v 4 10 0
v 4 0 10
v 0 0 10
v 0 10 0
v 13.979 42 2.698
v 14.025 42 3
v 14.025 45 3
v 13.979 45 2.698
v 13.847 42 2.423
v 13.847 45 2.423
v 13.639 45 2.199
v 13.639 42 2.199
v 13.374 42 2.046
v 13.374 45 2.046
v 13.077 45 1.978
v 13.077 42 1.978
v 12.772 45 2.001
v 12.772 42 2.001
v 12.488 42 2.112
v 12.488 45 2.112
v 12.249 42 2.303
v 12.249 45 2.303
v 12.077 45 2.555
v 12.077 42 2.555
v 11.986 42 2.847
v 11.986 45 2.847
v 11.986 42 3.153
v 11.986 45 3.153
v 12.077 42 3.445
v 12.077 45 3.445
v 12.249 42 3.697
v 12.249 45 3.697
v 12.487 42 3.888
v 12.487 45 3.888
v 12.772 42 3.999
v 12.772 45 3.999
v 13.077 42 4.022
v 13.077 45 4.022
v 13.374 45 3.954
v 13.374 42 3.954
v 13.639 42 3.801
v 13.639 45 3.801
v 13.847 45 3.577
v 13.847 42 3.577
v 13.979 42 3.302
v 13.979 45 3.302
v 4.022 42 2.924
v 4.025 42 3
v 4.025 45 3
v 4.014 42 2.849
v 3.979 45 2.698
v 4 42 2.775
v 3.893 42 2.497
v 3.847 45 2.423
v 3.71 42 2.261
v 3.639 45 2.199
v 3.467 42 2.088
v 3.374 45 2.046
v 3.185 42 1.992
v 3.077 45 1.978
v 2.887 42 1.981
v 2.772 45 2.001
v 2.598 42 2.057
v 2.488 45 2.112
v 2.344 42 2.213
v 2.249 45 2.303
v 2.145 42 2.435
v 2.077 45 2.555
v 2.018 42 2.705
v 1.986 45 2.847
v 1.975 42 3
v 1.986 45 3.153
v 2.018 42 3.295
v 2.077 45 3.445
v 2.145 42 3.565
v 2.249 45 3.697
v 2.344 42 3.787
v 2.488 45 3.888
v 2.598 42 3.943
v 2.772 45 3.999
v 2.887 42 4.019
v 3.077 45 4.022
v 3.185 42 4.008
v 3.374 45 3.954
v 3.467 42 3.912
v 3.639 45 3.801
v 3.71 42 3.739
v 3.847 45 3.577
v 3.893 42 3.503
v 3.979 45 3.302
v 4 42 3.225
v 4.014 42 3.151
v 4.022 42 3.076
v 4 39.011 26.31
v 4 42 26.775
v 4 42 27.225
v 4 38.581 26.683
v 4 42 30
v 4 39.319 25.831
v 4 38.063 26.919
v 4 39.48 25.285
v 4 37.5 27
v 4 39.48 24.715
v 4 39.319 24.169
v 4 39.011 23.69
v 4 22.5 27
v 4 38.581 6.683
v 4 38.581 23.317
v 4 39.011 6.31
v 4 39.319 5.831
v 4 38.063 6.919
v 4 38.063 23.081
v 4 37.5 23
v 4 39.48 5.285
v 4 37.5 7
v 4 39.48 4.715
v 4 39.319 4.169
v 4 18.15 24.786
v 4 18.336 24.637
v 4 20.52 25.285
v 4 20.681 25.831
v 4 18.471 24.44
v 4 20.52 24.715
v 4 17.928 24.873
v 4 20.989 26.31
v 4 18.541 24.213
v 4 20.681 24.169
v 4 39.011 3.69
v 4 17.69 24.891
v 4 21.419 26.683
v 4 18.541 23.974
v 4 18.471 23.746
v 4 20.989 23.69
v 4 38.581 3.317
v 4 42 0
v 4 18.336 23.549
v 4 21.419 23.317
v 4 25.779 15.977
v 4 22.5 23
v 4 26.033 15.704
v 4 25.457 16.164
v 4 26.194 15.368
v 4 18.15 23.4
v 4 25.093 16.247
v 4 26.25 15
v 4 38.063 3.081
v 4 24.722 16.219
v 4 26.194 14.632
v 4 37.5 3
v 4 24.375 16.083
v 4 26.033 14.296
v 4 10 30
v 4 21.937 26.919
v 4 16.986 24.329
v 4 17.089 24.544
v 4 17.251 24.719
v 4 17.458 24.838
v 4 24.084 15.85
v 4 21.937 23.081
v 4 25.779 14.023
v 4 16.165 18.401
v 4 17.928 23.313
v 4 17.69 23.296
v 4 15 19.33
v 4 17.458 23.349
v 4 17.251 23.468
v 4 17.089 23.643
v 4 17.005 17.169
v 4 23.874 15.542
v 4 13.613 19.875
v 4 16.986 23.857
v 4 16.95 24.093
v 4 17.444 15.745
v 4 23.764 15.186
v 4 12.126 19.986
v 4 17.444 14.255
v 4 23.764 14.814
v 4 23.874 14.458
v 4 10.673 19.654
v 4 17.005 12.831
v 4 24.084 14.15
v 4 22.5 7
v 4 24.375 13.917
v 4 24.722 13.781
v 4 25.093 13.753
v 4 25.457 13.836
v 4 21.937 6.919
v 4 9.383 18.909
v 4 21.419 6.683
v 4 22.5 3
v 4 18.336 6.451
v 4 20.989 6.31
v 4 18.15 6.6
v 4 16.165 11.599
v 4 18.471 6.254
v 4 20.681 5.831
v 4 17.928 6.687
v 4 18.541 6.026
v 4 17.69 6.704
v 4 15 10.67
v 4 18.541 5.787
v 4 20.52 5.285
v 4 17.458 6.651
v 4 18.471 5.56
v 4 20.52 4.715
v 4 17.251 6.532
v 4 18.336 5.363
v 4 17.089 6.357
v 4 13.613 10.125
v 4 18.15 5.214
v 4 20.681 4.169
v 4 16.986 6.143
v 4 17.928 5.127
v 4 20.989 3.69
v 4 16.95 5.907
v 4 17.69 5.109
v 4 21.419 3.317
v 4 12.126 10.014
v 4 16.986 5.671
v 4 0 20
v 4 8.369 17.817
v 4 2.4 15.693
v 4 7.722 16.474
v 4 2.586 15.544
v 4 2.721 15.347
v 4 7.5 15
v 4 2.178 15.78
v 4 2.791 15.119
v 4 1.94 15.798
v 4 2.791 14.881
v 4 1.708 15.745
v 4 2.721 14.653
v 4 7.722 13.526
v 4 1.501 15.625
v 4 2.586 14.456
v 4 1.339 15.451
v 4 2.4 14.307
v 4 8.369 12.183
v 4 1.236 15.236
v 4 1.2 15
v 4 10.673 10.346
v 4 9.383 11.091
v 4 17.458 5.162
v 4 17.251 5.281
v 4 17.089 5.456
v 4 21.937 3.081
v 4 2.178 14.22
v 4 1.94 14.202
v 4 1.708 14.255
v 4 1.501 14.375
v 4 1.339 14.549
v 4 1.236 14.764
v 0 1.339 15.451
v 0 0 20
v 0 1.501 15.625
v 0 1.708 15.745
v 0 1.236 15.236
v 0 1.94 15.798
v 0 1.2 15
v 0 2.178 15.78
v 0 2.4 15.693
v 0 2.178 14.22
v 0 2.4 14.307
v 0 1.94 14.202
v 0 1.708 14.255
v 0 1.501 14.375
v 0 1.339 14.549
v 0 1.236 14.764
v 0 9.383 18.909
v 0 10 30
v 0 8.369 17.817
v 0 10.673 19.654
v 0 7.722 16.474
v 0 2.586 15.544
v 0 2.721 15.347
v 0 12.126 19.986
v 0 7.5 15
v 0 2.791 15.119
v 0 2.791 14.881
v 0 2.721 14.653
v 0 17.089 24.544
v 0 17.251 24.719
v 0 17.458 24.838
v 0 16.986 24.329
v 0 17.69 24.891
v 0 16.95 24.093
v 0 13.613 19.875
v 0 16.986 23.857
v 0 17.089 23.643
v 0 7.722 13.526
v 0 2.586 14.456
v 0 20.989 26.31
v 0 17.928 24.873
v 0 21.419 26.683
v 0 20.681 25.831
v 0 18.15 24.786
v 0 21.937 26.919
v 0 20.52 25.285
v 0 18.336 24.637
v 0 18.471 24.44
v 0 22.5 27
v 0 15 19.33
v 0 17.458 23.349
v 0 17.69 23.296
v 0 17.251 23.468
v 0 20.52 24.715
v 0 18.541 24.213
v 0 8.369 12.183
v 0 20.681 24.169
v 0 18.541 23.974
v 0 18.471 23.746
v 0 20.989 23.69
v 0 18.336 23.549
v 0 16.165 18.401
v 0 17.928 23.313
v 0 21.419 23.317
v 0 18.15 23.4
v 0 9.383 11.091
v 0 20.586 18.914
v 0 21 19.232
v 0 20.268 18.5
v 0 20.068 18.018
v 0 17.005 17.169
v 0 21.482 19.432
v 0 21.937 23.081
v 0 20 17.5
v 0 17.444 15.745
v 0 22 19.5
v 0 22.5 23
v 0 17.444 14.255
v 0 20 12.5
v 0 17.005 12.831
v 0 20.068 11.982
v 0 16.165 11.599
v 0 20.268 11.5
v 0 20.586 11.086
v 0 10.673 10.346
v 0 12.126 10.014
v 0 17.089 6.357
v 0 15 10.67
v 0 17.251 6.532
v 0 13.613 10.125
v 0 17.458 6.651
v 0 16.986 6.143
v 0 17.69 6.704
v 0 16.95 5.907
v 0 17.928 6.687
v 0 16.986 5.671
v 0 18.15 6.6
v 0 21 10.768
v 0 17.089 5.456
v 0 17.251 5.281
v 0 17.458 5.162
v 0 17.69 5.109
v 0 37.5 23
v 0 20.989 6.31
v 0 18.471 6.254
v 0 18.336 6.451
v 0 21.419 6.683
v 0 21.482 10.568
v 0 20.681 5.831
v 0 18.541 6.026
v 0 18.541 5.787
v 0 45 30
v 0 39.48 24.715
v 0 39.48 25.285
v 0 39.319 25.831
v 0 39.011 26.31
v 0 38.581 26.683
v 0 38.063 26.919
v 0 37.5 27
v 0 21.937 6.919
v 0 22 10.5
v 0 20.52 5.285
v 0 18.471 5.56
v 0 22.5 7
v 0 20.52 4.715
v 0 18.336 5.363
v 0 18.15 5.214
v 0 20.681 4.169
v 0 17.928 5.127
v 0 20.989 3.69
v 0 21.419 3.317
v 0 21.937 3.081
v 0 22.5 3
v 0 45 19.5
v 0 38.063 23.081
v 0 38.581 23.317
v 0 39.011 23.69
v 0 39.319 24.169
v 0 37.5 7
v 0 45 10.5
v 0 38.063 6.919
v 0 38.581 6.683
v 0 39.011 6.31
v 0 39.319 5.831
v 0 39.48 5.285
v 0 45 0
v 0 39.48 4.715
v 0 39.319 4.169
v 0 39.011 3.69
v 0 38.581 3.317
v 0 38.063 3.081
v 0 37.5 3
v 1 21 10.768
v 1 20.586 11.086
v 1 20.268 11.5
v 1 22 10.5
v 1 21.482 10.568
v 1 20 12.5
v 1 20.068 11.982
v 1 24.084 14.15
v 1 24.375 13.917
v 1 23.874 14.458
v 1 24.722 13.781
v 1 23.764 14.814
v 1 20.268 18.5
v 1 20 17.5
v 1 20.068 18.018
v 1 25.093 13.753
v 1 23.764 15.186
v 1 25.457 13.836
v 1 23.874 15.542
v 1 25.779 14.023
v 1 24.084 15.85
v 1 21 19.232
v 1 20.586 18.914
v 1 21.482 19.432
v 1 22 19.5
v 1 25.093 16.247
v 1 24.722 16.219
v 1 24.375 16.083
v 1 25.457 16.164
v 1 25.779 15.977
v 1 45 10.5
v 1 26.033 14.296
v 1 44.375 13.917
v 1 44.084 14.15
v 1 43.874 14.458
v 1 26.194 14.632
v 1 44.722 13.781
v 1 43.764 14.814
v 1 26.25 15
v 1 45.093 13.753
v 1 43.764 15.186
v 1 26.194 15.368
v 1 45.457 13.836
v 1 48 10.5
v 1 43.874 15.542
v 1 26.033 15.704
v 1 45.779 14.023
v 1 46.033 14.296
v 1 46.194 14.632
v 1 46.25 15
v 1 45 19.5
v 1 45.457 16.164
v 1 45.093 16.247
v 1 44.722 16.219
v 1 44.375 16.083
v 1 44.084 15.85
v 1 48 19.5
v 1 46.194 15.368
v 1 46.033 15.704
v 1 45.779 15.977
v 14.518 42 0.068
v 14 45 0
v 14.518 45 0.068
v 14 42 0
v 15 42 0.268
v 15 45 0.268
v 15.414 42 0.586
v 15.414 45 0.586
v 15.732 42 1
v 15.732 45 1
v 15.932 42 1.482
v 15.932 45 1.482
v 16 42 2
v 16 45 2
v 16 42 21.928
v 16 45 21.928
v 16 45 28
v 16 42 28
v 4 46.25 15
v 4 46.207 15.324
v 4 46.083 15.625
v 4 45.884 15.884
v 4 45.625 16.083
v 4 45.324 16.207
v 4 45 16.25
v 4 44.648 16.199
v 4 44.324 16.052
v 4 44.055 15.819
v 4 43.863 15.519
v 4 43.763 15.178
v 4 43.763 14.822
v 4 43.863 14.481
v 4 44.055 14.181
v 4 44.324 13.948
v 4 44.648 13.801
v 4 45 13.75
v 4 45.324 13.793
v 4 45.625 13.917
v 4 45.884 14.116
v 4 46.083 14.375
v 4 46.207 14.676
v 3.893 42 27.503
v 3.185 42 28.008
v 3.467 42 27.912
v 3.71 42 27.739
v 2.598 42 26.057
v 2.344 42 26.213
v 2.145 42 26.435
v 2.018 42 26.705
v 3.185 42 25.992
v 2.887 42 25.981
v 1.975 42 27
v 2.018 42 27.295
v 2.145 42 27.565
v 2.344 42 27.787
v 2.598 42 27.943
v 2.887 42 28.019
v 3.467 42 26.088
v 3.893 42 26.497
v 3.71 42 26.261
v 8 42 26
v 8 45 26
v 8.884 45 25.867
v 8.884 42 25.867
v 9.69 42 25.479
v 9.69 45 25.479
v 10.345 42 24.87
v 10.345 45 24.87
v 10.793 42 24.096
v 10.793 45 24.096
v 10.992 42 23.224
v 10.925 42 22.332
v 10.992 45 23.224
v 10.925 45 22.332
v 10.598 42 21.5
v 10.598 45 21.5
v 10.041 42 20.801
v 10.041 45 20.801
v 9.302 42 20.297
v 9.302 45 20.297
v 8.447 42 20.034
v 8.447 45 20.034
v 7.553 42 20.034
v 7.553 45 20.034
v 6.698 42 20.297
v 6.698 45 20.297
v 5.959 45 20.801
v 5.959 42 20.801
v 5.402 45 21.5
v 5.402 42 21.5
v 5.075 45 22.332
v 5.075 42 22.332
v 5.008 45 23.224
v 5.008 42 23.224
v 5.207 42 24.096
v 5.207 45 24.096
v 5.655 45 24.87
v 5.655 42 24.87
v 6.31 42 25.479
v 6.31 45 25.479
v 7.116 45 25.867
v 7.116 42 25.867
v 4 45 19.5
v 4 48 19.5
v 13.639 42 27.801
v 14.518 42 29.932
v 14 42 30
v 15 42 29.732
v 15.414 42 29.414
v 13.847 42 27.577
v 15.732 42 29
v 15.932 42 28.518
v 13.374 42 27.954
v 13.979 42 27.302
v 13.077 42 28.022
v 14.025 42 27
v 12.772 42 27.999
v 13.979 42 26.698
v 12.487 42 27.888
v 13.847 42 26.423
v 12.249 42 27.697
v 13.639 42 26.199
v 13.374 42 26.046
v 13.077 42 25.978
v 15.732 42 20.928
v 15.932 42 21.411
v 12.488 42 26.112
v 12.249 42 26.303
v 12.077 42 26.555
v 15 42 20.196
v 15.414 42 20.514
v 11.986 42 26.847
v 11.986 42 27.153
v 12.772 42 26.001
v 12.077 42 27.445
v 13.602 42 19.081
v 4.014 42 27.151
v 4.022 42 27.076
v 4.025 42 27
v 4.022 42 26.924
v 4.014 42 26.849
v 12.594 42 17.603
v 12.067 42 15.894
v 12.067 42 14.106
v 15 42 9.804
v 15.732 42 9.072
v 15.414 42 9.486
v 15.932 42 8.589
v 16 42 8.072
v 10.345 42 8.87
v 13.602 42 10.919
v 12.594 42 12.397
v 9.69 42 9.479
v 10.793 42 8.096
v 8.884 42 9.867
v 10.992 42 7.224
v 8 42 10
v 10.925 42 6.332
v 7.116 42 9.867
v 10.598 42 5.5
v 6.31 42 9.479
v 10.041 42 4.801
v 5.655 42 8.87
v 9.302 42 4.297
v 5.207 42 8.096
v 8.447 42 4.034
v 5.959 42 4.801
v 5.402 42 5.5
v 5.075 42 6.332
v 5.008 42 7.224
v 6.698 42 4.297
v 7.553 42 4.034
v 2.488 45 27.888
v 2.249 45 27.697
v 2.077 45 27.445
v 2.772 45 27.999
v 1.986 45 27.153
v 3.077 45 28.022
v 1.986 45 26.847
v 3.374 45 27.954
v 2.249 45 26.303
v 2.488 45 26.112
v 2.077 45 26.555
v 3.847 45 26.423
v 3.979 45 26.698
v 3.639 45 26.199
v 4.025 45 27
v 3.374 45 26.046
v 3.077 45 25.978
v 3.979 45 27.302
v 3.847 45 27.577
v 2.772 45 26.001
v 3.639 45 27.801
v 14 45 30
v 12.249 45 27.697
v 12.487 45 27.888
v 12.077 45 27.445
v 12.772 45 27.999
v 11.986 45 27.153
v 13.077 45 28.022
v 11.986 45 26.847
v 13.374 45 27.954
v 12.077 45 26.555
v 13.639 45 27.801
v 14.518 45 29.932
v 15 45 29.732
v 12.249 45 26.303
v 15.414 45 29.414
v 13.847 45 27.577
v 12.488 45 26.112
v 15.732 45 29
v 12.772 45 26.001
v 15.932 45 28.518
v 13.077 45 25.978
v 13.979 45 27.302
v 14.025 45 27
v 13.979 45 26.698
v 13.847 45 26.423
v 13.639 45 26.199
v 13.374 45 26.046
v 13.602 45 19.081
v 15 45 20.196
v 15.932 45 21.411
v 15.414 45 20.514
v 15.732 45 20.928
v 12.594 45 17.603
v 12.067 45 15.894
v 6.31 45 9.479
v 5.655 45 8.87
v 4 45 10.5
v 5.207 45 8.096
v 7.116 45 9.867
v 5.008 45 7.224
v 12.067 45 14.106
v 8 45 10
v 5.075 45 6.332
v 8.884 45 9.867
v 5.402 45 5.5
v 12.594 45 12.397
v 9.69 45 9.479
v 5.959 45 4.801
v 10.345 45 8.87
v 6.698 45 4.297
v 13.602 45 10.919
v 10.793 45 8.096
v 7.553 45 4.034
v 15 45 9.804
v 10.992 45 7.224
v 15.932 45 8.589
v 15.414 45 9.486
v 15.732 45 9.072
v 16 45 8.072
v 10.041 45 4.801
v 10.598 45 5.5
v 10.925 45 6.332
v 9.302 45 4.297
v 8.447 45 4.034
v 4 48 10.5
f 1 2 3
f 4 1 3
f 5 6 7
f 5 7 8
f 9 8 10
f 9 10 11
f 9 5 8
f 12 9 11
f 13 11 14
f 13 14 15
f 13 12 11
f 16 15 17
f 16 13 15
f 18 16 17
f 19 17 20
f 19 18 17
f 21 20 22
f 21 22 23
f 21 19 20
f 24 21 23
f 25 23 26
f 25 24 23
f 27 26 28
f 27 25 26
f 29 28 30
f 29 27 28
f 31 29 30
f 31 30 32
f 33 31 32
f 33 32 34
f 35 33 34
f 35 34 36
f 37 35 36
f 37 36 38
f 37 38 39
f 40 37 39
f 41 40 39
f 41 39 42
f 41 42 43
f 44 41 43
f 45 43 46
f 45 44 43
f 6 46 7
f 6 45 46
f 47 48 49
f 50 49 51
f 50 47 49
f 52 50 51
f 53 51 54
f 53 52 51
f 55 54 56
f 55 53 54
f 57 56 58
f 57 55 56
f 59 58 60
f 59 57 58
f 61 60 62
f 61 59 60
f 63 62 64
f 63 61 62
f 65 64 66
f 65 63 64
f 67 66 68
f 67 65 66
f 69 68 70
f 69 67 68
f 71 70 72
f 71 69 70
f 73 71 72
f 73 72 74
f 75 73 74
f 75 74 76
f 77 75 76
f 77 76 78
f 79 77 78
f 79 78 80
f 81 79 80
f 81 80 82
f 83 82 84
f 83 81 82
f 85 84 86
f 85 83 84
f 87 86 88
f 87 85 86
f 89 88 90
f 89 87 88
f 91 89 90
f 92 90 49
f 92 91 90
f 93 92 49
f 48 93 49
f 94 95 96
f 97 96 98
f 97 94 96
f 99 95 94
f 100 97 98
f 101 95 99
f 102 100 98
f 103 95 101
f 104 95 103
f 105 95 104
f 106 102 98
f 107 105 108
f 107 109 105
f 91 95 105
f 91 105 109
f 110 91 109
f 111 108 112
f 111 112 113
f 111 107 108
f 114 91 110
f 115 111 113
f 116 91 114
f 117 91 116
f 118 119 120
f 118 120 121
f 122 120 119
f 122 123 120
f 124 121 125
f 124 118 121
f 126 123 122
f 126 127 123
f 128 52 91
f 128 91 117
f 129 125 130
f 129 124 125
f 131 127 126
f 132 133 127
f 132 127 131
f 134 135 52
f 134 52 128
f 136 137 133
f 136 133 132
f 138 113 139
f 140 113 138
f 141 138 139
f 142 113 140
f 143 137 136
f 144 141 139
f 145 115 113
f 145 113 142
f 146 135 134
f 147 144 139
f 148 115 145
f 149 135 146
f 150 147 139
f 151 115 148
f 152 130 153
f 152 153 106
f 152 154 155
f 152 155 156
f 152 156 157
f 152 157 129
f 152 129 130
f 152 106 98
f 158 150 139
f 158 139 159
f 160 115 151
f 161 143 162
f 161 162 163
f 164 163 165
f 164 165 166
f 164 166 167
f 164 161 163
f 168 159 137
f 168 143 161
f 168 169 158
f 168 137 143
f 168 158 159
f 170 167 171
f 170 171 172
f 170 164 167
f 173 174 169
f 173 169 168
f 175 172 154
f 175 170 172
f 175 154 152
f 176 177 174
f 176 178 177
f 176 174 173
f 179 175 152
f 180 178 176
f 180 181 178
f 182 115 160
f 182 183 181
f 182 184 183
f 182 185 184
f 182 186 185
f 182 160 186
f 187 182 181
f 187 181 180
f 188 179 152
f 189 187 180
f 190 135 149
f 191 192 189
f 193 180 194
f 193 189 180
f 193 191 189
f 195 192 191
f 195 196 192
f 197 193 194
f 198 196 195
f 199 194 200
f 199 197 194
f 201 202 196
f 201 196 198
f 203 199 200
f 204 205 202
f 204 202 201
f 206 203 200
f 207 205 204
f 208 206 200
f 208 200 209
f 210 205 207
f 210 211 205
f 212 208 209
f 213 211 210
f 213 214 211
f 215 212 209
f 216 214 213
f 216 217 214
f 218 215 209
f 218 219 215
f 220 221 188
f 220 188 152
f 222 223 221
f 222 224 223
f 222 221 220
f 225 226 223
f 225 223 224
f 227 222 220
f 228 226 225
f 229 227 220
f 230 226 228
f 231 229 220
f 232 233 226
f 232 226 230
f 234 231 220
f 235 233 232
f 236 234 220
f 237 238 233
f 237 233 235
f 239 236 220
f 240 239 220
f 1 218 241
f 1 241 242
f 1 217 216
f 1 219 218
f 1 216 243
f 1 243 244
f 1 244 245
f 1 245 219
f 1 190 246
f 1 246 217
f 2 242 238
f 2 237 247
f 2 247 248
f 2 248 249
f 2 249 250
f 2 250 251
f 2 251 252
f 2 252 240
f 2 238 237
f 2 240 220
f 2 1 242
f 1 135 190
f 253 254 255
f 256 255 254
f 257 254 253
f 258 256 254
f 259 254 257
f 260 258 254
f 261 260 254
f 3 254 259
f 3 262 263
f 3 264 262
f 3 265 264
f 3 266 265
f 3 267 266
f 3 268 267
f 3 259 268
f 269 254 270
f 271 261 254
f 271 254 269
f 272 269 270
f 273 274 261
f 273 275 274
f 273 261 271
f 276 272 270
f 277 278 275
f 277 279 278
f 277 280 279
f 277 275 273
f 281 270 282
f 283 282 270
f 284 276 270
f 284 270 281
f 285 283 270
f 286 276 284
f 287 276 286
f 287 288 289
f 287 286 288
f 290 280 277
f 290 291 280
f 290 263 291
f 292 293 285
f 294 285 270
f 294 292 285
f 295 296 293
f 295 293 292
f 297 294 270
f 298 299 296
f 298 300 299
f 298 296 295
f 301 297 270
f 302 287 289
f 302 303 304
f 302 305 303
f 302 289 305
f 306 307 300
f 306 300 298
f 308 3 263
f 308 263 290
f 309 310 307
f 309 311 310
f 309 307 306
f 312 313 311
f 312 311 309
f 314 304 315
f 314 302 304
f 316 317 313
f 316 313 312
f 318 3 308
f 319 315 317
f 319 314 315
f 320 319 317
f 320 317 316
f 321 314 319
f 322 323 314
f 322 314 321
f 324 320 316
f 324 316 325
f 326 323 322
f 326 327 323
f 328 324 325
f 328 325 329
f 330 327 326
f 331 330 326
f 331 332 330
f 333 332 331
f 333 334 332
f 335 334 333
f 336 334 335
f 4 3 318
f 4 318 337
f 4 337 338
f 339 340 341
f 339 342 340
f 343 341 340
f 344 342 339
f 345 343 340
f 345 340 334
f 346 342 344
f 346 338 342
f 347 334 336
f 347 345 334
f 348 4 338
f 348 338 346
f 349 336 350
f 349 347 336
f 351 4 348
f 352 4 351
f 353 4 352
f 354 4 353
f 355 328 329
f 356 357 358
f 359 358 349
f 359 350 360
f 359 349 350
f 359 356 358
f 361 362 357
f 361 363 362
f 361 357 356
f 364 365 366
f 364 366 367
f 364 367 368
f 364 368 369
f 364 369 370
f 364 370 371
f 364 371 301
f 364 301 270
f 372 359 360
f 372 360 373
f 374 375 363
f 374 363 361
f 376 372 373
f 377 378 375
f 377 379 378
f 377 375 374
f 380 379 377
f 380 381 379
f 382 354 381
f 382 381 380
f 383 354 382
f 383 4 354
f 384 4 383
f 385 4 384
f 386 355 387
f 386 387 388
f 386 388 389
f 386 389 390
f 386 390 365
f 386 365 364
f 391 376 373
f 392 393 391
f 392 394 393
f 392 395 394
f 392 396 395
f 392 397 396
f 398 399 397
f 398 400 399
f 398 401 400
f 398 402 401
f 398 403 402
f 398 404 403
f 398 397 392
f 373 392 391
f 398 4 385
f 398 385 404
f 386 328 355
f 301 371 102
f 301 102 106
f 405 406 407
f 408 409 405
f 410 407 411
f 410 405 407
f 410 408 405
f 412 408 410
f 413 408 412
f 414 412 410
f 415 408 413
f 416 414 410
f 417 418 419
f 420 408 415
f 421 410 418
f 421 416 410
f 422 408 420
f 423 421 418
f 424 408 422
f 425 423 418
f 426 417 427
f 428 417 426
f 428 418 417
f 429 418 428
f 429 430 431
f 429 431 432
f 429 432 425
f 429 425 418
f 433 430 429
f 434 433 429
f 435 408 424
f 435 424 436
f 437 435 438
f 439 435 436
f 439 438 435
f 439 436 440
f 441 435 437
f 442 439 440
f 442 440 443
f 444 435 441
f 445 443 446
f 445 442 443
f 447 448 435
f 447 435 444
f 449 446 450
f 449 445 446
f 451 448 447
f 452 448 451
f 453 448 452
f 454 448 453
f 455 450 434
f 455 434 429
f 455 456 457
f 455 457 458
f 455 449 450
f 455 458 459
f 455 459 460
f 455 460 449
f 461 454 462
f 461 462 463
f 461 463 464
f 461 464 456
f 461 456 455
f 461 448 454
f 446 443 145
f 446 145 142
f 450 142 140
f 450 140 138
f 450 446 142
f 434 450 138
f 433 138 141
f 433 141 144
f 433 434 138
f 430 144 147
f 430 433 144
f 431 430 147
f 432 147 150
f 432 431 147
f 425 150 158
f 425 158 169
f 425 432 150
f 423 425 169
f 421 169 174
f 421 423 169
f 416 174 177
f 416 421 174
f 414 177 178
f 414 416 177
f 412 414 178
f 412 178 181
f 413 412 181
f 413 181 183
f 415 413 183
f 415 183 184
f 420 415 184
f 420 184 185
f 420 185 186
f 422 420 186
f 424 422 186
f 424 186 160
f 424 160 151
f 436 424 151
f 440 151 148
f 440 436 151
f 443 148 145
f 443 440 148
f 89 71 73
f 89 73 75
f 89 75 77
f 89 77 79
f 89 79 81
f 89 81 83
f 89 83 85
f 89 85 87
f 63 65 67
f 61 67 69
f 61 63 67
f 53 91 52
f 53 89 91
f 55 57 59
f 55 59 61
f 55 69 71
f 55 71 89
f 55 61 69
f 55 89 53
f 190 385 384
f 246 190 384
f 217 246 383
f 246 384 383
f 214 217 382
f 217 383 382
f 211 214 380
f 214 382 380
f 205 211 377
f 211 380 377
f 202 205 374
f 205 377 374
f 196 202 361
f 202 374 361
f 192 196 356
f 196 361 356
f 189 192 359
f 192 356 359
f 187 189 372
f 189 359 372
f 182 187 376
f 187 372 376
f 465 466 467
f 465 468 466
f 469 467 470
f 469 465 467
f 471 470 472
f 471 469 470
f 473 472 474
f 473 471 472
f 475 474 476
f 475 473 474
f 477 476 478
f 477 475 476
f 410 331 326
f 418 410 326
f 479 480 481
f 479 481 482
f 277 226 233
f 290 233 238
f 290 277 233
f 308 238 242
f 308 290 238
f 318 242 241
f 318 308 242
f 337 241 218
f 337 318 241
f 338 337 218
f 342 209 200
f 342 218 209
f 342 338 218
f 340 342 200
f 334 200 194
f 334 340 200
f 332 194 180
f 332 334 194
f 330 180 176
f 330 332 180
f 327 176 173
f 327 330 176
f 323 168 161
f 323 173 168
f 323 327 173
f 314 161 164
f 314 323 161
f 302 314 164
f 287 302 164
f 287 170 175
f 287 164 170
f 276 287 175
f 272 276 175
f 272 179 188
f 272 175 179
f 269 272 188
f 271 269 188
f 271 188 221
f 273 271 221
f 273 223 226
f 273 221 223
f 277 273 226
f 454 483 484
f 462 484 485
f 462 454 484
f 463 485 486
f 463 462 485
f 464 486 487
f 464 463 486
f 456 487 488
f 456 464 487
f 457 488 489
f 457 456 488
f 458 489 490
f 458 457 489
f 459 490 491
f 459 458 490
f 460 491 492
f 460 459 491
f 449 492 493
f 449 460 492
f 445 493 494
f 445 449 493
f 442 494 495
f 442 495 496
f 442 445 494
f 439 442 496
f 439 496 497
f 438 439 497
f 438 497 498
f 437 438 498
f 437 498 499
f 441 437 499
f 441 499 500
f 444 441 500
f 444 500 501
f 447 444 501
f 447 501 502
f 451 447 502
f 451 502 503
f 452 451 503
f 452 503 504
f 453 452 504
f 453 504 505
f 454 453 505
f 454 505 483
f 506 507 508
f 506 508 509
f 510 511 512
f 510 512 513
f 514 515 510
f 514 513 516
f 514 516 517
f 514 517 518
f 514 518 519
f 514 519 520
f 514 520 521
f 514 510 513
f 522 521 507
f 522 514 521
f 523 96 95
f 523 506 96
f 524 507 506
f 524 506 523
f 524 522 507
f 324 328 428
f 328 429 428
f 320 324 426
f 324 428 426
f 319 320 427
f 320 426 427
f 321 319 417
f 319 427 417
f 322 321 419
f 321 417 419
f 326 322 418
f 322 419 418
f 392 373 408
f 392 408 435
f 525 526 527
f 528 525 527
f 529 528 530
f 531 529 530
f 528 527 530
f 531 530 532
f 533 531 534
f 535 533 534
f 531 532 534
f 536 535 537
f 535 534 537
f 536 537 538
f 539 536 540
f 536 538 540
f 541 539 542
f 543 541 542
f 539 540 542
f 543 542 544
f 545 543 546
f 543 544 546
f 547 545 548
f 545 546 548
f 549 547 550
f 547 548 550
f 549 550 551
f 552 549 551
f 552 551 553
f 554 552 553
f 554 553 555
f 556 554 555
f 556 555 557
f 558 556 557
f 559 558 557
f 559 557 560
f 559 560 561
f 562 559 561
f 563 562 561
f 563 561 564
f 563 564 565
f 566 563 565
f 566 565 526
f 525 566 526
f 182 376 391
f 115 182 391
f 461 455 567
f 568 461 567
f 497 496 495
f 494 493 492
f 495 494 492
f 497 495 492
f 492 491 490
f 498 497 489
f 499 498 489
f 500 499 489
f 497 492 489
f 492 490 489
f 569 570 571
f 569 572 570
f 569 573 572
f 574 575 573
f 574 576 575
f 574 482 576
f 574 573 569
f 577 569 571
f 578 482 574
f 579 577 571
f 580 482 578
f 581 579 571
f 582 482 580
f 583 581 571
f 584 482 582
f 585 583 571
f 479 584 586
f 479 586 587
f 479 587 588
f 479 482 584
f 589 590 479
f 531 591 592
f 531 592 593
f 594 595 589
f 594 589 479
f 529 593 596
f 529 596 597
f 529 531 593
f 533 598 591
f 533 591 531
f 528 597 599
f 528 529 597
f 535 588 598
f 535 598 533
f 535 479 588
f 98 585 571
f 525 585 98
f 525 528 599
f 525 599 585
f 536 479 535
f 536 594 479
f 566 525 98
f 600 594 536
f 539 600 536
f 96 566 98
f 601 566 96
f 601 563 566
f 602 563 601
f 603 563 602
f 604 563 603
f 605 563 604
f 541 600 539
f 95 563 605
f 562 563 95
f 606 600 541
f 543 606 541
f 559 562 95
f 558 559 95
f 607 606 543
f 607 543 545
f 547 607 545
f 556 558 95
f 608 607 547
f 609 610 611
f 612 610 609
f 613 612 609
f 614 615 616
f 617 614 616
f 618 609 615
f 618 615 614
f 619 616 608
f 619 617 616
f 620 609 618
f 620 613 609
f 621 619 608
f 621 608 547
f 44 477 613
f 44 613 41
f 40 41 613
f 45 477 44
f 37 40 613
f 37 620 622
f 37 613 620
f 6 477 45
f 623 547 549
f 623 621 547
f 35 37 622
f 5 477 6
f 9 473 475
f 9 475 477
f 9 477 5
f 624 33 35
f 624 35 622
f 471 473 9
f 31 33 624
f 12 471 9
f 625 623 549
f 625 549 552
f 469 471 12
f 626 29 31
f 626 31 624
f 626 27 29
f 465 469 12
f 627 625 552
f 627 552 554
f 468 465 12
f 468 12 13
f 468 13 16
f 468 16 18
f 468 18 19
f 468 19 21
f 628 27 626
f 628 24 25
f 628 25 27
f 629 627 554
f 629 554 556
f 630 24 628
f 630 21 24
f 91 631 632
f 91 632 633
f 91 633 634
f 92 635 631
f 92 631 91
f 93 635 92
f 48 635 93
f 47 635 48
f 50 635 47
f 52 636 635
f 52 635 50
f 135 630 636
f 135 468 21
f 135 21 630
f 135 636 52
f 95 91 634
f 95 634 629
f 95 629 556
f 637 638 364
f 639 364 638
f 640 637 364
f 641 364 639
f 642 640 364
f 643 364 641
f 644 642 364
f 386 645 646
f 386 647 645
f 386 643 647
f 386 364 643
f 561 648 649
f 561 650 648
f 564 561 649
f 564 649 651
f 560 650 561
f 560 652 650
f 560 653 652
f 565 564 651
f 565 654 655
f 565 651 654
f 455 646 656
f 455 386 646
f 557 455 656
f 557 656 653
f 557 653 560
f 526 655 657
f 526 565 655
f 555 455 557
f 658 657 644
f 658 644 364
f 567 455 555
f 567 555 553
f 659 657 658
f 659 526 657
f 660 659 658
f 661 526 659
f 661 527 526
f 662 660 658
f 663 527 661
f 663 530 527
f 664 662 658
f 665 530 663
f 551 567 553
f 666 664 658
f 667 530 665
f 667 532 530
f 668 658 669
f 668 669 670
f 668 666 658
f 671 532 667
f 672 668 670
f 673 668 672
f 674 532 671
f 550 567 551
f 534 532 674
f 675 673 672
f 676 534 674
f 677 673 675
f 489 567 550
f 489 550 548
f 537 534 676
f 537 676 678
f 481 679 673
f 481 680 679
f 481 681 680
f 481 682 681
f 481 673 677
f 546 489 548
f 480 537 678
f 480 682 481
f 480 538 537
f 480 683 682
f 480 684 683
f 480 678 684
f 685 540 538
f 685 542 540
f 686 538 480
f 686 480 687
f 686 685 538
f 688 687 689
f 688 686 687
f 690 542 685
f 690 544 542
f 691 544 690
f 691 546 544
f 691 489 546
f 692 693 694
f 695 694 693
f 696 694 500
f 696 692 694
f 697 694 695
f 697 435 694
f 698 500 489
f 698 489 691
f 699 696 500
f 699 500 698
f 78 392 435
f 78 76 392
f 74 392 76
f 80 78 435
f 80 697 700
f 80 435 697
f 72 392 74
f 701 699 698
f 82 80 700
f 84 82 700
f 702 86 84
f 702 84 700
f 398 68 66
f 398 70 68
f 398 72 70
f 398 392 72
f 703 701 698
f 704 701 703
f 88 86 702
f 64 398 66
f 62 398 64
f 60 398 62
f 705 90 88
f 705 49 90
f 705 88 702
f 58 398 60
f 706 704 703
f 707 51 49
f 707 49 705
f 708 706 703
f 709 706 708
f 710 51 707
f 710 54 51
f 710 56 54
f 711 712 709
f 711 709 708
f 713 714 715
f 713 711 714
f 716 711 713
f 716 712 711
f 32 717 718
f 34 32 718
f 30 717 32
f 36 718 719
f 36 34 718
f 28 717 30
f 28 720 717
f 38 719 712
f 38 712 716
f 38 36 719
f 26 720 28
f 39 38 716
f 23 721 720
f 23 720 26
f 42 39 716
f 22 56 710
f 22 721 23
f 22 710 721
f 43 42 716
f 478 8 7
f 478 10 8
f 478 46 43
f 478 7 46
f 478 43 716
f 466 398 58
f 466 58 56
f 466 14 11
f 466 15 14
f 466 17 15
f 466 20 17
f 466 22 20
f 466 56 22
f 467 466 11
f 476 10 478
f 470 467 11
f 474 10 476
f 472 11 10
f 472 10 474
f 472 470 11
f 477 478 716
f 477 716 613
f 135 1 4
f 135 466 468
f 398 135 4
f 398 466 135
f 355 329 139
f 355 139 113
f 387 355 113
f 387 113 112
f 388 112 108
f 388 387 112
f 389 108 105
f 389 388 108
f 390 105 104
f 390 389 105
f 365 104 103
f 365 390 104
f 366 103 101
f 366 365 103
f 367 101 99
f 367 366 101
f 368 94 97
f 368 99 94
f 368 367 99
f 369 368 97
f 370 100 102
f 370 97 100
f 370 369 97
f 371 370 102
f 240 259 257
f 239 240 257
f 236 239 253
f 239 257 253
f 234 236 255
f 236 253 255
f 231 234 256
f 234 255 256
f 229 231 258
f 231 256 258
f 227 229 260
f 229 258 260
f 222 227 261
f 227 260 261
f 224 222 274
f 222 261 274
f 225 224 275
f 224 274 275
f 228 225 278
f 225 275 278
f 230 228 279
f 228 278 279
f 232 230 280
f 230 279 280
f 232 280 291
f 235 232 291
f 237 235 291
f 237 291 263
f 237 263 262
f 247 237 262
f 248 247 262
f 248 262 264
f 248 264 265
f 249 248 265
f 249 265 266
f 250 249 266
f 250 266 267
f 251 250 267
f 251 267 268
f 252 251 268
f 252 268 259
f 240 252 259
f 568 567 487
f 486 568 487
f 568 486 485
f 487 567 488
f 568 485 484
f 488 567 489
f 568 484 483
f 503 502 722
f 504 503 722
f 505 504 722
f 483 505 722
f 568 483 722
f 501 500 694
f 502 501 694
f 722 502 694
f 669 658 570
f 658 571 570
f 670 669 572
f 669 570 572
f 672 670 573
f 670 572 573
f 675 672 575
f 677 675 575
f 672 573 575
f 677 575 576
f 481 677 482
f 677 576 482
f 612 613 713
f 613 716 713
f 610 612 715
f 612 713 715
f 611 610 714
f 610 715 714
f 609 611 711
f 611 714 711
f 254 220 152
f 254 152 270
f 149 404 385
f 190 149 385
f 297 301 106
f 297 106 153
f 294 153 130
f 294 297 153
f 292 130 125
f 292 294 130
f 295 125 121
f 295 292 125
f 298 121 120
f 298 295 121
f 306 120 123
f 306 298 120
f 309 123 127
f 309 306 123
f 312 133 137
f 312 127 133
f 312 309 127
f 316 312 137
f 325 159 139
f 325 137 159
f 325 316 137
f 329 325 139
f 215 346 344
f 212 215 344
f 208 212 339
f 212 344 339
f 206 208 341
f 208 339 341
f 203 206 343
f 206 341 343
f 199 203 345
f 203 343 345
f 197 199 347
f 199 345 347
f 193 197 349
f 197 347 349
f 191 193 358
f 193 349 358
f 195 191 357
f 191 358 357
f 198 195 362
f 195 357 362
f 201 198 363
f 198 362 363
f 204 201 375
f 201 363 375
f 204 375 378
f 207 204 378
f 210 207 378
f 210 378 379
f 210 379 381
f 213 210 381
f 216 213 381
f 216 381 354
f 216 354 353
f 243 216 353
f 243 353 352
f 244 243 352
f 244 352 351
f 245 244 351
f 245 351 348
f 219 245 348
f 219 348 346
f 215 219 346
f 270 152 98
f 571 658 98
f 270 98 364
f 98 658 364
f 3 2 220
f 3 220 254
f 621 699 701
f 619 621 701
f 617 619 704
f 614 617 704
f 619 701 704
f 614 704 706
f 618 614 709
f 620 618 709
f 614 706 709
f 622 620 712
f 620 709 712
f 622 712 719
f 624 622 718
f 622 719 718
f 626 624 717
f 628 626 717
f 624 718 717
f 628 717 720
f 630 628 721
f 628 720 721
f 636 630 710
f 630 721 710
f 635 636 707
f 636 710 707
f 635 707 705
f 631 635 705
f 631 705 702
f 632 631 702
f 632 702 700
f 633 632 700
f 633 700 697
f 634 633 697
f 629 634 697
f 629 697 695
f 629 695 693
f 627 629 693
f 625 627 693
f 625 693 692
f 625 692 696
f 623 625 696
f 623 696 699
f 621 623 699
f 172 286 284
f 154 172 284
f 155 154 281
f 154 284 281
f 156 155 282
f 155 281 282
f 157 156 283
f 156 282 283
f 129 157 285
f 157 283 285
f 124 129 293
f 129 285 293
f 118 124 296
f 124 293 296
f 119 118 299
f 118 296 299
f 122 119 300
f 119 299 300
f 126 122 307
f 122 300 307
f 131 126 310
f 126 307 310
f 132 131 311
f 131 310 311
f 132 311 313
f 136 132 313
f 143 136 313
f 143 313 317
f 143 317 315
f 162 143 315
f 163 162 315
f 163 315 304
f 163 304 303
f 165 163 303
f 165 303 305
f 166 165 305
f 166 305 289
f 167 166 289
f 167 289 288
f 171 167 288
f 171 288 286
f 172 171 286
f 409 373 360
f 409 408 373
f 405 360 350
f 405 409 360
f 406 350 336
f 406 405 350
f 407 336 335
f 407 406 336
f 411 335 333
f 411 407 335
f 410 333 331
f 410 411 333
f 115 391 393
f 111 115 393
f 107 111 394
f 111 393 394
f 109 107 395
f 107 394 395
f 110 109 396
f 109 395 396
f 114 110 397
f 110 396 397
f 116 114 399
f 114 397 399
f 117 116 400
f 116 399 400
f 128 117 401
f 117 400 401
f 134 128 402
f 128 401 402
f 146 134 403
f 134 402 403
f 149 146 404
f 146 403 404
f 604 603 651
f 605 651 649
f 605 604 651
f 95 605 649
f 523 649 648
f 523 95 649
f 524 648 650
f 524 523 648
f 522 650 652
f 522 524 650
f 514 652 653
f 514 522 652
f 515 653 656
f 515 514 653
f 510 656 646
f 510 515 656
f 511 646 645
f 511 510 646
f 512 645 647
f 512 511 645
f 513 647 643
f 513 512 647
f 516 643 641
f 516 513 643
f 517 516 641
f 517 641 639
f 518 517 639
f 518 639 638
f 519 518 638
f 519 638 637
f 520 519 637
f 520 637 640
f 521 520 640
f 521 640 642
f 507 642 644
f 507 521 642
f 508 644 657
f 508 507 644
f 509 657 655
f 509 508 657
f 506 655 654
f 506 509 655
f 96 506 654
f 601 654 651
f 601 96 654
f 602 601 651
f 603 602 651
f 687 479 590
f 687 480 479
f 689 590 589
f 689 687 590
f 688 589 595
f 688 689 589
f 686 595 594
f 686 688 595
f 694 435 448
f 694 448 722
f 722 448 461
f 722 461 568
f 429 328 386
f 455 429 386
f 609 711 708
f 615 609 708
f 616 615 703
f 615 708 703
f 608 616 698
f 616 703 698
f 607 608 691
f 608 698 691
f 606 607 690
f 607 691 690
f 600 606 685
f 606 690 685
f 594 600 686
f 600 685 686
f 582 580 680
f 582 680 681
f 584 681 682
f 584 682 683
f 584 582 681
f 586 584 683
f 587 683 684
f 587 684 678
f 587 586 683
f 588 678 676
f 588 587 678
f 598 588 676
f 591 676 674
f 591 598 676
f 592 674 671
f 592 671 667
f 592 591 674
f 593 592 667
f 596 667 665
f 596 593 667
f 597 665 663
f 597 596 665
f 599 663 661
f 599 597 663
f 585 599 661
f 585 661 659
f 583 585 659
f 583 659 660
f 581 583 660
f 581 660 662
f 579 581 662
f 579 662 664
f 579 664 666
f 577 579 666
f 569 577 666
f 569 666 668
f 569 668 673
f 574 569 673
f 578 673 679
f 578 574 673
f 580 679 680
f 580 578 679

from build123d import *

# Parameters (mm, degrees)
EXTRUDE_1_DEPTH              = 30
SKETCH_3_R                   = 5
CUT_EXTRUDE_1_DEPTH          = 57.400354609
SKETCH_6_R                   = 3
CUT_EXTRUDE_3_DEPTH          = 57.400354609
SKETCH_9_W                   = 4
SKETCH_9_H                   = 9
EXTRUDE_3_DEPTH              = 3
SKETCH_10_W                  = 9
SKETCH_10_H                  = 28
CUT_EXTRUDE_4_DEPTH          = 1
HOLE_START                   = 1
HOLE_WIZARD_M3_1_OUTLINE_R   = 1.25
HOLE_WIZARD_M3_1_DEPTH       = 3
CUT_EXTRUDE_5_DEPTH          = 59.821764679
CHAMFER_1_SIZE               = 10
HOLE_START_2                 = 42
HOLE_WIZARD_M2_5_3_OUTLINE_R = 1.025
HOLE_WIZARD_M2_5_3_DEPTH     = 3
CUT_EXTRUDE_6_REACH          = 58.4
SKETCH_18_R                  = 6
FILLET_2_R                   = 2
FILLET_3_R                   = 2
HOLE_WIZARD_M2_1_D           = 1.6


# Read off the part's stored shape, not the designer's step: M3 螺纹孔1, M2.5 螺纹孔3
with BuildPart() as part:
    # 草图2 → 凸台-拉伸1 (new body)
    with BuildSketch(Plane.XY):
        Polygon((16, 42), (4, 42), (4, 0), (0, 0), (0, 45), (16, 45), align=None)
    extrude(amount=EXTRUDE_1_DEPTH)

    # 草图3 → 切除-拉伸1 (cut, through all)
    with BuildSketch(Plane(origin=(0, 0, 30), x_dir=(0, 0, -1), z_dir=(1, 0, 0))):
        with Locations(Location((15, 12.5, 0), (0, 0, 270))):
            Circle(SKETCH_3_R)
    extrude(amount=CUT_EXTRUDE_1_DEPTH, mode=Mode.SUBTRACT)

    # 草图6 → 切除-拉伸3 (cut, through all)
    with BuildSketch(Plane(origin=(0, 45, 0), x_dir=(1, 0, 0), z_dir=(0, 1, 0))):
        with Locations(Location((8, -23, 0), (0, 0, 270))):
            Circle(SKETCH_6_R)
        with Locations(Location((8, -7, 0), (0, 0, 270))):
            Circle(SKETCH_6_R)
    extrude(amount=-CUT_EXTRUDE_3_DEPTH, mode=Mode.SUBTRACT)

    # 草图9 → 凸台-拉伸3 (add)
    with BuildSketch(Plane(origin=(0, 45, 0), x_dir=(1, 0, 0), z_dir=(0, 1, 0))):
        with Locations((2, -15)):
            Rectangle(SKETCH_9_W, SKETCH_9_H)
    extrude(amount=EXTRUDE_3_DEPTH)

    # 草图10 → 切除-拉伸4 (cut)
    with BuildSketch(Plane.ZY):
        with Locations((15, 34)):
            Rectangle(SKETCH_10_W, SKETCH_10_H)
    extrude(amount=-CUT_EXTRUDE_4_DEPTH, mode=Mode.SUBTRACT)

    # M3 螺纹孔1 outline → M3 螺纹孔1 (cut)
    with BuildSketch(Plane.YZ.offset(HOLE_START)):
        with Locations((25, 15)):
            Circle(HOLE_WIZARD_M3_1_OUTLINE_R)
        with Locations((45, 15)):
            Circle(HOLE_WIZARD_M3_1_OUTLINE_R)
    extrude(amount=HOLE_WIZARD_M3_1_DEPTH, mode=Mode.SUBTRACT)

    # 草图13 → 切除-拉伸5 (cut, through all)
    with BuildSketch(Plane.ZY):
        with BuildLine():
            Line((27, 37.5), (27, 22.5))
            ThreePointArc((27, 22.5), (25, 20.5), (23, 22.5))
            Line((23, 22.5), (23, 37.5))
            ThreePointArc((23, 37.5), (25, 39.5), (27, 37.5))
        make_face()
        with BuildLine():
            Line((3, 37.5), (3, 22.5))
            ThreePointArc((3, 22.5), (5, 20.5), (7, 22.5))
            Line((7, 22.5), (7, 37.5))
            ThreePointArc((7, 37.5), (5, 39.5), (3, 37.5))
        make_face()
    extrude(amount=-CUT_EXTRUDE_5_DEPTH, mode=Mode.SUBTRACT)

    # 倒角1
    chamfer_1_edges = [part.edges().sort_by_distance(p)[0] for p in [
        (2, 0, 30),
        (2, 0, 0),
    ]]
    chamfer(chamfer_1_edges, length=CHAMFER_1_SIZE)

    # M2.5 螺纹孔3 outline → M2.5 螺纹孔3 (cut)
    with BuildSketch(Plane(origin=(0, 0, 0), x_dir=(1, 0, 0), z_dir=(0, 1, 0)).offset(HOLE_START_2)):
        with Locations((3, -27)):
            Circle(HOLE_WIZARD_M2_5_3_OUTLINE_R)
        with Locations((13, -27)):
            Circle(HOLE_WIZARD_M2_5_3_OUTLINE_R)
        with Locations((13, -3)):
            Circle(HOLE_WIZARD_M2_5_3_OUTLINE_R)
        with Locations((3, -3)):
            Circle(HOLE_WIZARD_M2_5_3_OUTLINE_R)
    extrude(amount=HOLE_WIZARD_M2_5_3_DEPTH, mode=Mode.SUBTRACT)

    # 草图18 → 切除-拉伸6 (cut, up to next)
    with BuildSketch(Plane(origin=(0, 45, 0), x_dir=(1, 0, 0), z_dir=(0, 1, 0)), mode=Mode.PRIVATE) as cut_extrude_6_sk1:
        with Locations((18, -15)):
            Circle(SKETCH_18_R)
    cut_extrude_6_tool1 = extrude(cut_extrude_6_sk1.sketch, amount=-CUT_EXTRUDE_6_REACH, mode=Mode.PRIVATE) & part.part
    add(cut_extrude_6_tool1.solids().sort_by_distance((18, 45, 15))[0], mode=Mode.SUBTRACT)

    # 圆角2
    fillet_2_edges = [part.edges().sort_by_distance(p)[0] for p in [
        (16, 43.5, 30),
        (16, 43.5, 20.656854249),
        (16, 43.5, 9.343145751),
        (16, 43.5, 0),
    ]]
    fillet(fillet_2_edges, radius=FILLET_2_R)

    # 圆角3
    fillet_3_edges = [part.edges().sort_by_distance(p)[0] for p in [
        (0.5, 20, 10.5),
        (0.5, 20, 19.5),
    ]]
    fillet(fillet_3_edges, radius=FILLET_3_R)

    # M2 螺纹孔1 (through all)
    with Locations(Plane(origin=(4, 17.75, 24.09326674), x_dir=(0, 1, 0), z_dir=(1, 0, 0))):
        with Locations((0, 0), (0, -18.18653348), (-15.75, -9.09326674)):
            Hole(HOLE_WIZARD_M2_1_D / 2)


solid = part.part
